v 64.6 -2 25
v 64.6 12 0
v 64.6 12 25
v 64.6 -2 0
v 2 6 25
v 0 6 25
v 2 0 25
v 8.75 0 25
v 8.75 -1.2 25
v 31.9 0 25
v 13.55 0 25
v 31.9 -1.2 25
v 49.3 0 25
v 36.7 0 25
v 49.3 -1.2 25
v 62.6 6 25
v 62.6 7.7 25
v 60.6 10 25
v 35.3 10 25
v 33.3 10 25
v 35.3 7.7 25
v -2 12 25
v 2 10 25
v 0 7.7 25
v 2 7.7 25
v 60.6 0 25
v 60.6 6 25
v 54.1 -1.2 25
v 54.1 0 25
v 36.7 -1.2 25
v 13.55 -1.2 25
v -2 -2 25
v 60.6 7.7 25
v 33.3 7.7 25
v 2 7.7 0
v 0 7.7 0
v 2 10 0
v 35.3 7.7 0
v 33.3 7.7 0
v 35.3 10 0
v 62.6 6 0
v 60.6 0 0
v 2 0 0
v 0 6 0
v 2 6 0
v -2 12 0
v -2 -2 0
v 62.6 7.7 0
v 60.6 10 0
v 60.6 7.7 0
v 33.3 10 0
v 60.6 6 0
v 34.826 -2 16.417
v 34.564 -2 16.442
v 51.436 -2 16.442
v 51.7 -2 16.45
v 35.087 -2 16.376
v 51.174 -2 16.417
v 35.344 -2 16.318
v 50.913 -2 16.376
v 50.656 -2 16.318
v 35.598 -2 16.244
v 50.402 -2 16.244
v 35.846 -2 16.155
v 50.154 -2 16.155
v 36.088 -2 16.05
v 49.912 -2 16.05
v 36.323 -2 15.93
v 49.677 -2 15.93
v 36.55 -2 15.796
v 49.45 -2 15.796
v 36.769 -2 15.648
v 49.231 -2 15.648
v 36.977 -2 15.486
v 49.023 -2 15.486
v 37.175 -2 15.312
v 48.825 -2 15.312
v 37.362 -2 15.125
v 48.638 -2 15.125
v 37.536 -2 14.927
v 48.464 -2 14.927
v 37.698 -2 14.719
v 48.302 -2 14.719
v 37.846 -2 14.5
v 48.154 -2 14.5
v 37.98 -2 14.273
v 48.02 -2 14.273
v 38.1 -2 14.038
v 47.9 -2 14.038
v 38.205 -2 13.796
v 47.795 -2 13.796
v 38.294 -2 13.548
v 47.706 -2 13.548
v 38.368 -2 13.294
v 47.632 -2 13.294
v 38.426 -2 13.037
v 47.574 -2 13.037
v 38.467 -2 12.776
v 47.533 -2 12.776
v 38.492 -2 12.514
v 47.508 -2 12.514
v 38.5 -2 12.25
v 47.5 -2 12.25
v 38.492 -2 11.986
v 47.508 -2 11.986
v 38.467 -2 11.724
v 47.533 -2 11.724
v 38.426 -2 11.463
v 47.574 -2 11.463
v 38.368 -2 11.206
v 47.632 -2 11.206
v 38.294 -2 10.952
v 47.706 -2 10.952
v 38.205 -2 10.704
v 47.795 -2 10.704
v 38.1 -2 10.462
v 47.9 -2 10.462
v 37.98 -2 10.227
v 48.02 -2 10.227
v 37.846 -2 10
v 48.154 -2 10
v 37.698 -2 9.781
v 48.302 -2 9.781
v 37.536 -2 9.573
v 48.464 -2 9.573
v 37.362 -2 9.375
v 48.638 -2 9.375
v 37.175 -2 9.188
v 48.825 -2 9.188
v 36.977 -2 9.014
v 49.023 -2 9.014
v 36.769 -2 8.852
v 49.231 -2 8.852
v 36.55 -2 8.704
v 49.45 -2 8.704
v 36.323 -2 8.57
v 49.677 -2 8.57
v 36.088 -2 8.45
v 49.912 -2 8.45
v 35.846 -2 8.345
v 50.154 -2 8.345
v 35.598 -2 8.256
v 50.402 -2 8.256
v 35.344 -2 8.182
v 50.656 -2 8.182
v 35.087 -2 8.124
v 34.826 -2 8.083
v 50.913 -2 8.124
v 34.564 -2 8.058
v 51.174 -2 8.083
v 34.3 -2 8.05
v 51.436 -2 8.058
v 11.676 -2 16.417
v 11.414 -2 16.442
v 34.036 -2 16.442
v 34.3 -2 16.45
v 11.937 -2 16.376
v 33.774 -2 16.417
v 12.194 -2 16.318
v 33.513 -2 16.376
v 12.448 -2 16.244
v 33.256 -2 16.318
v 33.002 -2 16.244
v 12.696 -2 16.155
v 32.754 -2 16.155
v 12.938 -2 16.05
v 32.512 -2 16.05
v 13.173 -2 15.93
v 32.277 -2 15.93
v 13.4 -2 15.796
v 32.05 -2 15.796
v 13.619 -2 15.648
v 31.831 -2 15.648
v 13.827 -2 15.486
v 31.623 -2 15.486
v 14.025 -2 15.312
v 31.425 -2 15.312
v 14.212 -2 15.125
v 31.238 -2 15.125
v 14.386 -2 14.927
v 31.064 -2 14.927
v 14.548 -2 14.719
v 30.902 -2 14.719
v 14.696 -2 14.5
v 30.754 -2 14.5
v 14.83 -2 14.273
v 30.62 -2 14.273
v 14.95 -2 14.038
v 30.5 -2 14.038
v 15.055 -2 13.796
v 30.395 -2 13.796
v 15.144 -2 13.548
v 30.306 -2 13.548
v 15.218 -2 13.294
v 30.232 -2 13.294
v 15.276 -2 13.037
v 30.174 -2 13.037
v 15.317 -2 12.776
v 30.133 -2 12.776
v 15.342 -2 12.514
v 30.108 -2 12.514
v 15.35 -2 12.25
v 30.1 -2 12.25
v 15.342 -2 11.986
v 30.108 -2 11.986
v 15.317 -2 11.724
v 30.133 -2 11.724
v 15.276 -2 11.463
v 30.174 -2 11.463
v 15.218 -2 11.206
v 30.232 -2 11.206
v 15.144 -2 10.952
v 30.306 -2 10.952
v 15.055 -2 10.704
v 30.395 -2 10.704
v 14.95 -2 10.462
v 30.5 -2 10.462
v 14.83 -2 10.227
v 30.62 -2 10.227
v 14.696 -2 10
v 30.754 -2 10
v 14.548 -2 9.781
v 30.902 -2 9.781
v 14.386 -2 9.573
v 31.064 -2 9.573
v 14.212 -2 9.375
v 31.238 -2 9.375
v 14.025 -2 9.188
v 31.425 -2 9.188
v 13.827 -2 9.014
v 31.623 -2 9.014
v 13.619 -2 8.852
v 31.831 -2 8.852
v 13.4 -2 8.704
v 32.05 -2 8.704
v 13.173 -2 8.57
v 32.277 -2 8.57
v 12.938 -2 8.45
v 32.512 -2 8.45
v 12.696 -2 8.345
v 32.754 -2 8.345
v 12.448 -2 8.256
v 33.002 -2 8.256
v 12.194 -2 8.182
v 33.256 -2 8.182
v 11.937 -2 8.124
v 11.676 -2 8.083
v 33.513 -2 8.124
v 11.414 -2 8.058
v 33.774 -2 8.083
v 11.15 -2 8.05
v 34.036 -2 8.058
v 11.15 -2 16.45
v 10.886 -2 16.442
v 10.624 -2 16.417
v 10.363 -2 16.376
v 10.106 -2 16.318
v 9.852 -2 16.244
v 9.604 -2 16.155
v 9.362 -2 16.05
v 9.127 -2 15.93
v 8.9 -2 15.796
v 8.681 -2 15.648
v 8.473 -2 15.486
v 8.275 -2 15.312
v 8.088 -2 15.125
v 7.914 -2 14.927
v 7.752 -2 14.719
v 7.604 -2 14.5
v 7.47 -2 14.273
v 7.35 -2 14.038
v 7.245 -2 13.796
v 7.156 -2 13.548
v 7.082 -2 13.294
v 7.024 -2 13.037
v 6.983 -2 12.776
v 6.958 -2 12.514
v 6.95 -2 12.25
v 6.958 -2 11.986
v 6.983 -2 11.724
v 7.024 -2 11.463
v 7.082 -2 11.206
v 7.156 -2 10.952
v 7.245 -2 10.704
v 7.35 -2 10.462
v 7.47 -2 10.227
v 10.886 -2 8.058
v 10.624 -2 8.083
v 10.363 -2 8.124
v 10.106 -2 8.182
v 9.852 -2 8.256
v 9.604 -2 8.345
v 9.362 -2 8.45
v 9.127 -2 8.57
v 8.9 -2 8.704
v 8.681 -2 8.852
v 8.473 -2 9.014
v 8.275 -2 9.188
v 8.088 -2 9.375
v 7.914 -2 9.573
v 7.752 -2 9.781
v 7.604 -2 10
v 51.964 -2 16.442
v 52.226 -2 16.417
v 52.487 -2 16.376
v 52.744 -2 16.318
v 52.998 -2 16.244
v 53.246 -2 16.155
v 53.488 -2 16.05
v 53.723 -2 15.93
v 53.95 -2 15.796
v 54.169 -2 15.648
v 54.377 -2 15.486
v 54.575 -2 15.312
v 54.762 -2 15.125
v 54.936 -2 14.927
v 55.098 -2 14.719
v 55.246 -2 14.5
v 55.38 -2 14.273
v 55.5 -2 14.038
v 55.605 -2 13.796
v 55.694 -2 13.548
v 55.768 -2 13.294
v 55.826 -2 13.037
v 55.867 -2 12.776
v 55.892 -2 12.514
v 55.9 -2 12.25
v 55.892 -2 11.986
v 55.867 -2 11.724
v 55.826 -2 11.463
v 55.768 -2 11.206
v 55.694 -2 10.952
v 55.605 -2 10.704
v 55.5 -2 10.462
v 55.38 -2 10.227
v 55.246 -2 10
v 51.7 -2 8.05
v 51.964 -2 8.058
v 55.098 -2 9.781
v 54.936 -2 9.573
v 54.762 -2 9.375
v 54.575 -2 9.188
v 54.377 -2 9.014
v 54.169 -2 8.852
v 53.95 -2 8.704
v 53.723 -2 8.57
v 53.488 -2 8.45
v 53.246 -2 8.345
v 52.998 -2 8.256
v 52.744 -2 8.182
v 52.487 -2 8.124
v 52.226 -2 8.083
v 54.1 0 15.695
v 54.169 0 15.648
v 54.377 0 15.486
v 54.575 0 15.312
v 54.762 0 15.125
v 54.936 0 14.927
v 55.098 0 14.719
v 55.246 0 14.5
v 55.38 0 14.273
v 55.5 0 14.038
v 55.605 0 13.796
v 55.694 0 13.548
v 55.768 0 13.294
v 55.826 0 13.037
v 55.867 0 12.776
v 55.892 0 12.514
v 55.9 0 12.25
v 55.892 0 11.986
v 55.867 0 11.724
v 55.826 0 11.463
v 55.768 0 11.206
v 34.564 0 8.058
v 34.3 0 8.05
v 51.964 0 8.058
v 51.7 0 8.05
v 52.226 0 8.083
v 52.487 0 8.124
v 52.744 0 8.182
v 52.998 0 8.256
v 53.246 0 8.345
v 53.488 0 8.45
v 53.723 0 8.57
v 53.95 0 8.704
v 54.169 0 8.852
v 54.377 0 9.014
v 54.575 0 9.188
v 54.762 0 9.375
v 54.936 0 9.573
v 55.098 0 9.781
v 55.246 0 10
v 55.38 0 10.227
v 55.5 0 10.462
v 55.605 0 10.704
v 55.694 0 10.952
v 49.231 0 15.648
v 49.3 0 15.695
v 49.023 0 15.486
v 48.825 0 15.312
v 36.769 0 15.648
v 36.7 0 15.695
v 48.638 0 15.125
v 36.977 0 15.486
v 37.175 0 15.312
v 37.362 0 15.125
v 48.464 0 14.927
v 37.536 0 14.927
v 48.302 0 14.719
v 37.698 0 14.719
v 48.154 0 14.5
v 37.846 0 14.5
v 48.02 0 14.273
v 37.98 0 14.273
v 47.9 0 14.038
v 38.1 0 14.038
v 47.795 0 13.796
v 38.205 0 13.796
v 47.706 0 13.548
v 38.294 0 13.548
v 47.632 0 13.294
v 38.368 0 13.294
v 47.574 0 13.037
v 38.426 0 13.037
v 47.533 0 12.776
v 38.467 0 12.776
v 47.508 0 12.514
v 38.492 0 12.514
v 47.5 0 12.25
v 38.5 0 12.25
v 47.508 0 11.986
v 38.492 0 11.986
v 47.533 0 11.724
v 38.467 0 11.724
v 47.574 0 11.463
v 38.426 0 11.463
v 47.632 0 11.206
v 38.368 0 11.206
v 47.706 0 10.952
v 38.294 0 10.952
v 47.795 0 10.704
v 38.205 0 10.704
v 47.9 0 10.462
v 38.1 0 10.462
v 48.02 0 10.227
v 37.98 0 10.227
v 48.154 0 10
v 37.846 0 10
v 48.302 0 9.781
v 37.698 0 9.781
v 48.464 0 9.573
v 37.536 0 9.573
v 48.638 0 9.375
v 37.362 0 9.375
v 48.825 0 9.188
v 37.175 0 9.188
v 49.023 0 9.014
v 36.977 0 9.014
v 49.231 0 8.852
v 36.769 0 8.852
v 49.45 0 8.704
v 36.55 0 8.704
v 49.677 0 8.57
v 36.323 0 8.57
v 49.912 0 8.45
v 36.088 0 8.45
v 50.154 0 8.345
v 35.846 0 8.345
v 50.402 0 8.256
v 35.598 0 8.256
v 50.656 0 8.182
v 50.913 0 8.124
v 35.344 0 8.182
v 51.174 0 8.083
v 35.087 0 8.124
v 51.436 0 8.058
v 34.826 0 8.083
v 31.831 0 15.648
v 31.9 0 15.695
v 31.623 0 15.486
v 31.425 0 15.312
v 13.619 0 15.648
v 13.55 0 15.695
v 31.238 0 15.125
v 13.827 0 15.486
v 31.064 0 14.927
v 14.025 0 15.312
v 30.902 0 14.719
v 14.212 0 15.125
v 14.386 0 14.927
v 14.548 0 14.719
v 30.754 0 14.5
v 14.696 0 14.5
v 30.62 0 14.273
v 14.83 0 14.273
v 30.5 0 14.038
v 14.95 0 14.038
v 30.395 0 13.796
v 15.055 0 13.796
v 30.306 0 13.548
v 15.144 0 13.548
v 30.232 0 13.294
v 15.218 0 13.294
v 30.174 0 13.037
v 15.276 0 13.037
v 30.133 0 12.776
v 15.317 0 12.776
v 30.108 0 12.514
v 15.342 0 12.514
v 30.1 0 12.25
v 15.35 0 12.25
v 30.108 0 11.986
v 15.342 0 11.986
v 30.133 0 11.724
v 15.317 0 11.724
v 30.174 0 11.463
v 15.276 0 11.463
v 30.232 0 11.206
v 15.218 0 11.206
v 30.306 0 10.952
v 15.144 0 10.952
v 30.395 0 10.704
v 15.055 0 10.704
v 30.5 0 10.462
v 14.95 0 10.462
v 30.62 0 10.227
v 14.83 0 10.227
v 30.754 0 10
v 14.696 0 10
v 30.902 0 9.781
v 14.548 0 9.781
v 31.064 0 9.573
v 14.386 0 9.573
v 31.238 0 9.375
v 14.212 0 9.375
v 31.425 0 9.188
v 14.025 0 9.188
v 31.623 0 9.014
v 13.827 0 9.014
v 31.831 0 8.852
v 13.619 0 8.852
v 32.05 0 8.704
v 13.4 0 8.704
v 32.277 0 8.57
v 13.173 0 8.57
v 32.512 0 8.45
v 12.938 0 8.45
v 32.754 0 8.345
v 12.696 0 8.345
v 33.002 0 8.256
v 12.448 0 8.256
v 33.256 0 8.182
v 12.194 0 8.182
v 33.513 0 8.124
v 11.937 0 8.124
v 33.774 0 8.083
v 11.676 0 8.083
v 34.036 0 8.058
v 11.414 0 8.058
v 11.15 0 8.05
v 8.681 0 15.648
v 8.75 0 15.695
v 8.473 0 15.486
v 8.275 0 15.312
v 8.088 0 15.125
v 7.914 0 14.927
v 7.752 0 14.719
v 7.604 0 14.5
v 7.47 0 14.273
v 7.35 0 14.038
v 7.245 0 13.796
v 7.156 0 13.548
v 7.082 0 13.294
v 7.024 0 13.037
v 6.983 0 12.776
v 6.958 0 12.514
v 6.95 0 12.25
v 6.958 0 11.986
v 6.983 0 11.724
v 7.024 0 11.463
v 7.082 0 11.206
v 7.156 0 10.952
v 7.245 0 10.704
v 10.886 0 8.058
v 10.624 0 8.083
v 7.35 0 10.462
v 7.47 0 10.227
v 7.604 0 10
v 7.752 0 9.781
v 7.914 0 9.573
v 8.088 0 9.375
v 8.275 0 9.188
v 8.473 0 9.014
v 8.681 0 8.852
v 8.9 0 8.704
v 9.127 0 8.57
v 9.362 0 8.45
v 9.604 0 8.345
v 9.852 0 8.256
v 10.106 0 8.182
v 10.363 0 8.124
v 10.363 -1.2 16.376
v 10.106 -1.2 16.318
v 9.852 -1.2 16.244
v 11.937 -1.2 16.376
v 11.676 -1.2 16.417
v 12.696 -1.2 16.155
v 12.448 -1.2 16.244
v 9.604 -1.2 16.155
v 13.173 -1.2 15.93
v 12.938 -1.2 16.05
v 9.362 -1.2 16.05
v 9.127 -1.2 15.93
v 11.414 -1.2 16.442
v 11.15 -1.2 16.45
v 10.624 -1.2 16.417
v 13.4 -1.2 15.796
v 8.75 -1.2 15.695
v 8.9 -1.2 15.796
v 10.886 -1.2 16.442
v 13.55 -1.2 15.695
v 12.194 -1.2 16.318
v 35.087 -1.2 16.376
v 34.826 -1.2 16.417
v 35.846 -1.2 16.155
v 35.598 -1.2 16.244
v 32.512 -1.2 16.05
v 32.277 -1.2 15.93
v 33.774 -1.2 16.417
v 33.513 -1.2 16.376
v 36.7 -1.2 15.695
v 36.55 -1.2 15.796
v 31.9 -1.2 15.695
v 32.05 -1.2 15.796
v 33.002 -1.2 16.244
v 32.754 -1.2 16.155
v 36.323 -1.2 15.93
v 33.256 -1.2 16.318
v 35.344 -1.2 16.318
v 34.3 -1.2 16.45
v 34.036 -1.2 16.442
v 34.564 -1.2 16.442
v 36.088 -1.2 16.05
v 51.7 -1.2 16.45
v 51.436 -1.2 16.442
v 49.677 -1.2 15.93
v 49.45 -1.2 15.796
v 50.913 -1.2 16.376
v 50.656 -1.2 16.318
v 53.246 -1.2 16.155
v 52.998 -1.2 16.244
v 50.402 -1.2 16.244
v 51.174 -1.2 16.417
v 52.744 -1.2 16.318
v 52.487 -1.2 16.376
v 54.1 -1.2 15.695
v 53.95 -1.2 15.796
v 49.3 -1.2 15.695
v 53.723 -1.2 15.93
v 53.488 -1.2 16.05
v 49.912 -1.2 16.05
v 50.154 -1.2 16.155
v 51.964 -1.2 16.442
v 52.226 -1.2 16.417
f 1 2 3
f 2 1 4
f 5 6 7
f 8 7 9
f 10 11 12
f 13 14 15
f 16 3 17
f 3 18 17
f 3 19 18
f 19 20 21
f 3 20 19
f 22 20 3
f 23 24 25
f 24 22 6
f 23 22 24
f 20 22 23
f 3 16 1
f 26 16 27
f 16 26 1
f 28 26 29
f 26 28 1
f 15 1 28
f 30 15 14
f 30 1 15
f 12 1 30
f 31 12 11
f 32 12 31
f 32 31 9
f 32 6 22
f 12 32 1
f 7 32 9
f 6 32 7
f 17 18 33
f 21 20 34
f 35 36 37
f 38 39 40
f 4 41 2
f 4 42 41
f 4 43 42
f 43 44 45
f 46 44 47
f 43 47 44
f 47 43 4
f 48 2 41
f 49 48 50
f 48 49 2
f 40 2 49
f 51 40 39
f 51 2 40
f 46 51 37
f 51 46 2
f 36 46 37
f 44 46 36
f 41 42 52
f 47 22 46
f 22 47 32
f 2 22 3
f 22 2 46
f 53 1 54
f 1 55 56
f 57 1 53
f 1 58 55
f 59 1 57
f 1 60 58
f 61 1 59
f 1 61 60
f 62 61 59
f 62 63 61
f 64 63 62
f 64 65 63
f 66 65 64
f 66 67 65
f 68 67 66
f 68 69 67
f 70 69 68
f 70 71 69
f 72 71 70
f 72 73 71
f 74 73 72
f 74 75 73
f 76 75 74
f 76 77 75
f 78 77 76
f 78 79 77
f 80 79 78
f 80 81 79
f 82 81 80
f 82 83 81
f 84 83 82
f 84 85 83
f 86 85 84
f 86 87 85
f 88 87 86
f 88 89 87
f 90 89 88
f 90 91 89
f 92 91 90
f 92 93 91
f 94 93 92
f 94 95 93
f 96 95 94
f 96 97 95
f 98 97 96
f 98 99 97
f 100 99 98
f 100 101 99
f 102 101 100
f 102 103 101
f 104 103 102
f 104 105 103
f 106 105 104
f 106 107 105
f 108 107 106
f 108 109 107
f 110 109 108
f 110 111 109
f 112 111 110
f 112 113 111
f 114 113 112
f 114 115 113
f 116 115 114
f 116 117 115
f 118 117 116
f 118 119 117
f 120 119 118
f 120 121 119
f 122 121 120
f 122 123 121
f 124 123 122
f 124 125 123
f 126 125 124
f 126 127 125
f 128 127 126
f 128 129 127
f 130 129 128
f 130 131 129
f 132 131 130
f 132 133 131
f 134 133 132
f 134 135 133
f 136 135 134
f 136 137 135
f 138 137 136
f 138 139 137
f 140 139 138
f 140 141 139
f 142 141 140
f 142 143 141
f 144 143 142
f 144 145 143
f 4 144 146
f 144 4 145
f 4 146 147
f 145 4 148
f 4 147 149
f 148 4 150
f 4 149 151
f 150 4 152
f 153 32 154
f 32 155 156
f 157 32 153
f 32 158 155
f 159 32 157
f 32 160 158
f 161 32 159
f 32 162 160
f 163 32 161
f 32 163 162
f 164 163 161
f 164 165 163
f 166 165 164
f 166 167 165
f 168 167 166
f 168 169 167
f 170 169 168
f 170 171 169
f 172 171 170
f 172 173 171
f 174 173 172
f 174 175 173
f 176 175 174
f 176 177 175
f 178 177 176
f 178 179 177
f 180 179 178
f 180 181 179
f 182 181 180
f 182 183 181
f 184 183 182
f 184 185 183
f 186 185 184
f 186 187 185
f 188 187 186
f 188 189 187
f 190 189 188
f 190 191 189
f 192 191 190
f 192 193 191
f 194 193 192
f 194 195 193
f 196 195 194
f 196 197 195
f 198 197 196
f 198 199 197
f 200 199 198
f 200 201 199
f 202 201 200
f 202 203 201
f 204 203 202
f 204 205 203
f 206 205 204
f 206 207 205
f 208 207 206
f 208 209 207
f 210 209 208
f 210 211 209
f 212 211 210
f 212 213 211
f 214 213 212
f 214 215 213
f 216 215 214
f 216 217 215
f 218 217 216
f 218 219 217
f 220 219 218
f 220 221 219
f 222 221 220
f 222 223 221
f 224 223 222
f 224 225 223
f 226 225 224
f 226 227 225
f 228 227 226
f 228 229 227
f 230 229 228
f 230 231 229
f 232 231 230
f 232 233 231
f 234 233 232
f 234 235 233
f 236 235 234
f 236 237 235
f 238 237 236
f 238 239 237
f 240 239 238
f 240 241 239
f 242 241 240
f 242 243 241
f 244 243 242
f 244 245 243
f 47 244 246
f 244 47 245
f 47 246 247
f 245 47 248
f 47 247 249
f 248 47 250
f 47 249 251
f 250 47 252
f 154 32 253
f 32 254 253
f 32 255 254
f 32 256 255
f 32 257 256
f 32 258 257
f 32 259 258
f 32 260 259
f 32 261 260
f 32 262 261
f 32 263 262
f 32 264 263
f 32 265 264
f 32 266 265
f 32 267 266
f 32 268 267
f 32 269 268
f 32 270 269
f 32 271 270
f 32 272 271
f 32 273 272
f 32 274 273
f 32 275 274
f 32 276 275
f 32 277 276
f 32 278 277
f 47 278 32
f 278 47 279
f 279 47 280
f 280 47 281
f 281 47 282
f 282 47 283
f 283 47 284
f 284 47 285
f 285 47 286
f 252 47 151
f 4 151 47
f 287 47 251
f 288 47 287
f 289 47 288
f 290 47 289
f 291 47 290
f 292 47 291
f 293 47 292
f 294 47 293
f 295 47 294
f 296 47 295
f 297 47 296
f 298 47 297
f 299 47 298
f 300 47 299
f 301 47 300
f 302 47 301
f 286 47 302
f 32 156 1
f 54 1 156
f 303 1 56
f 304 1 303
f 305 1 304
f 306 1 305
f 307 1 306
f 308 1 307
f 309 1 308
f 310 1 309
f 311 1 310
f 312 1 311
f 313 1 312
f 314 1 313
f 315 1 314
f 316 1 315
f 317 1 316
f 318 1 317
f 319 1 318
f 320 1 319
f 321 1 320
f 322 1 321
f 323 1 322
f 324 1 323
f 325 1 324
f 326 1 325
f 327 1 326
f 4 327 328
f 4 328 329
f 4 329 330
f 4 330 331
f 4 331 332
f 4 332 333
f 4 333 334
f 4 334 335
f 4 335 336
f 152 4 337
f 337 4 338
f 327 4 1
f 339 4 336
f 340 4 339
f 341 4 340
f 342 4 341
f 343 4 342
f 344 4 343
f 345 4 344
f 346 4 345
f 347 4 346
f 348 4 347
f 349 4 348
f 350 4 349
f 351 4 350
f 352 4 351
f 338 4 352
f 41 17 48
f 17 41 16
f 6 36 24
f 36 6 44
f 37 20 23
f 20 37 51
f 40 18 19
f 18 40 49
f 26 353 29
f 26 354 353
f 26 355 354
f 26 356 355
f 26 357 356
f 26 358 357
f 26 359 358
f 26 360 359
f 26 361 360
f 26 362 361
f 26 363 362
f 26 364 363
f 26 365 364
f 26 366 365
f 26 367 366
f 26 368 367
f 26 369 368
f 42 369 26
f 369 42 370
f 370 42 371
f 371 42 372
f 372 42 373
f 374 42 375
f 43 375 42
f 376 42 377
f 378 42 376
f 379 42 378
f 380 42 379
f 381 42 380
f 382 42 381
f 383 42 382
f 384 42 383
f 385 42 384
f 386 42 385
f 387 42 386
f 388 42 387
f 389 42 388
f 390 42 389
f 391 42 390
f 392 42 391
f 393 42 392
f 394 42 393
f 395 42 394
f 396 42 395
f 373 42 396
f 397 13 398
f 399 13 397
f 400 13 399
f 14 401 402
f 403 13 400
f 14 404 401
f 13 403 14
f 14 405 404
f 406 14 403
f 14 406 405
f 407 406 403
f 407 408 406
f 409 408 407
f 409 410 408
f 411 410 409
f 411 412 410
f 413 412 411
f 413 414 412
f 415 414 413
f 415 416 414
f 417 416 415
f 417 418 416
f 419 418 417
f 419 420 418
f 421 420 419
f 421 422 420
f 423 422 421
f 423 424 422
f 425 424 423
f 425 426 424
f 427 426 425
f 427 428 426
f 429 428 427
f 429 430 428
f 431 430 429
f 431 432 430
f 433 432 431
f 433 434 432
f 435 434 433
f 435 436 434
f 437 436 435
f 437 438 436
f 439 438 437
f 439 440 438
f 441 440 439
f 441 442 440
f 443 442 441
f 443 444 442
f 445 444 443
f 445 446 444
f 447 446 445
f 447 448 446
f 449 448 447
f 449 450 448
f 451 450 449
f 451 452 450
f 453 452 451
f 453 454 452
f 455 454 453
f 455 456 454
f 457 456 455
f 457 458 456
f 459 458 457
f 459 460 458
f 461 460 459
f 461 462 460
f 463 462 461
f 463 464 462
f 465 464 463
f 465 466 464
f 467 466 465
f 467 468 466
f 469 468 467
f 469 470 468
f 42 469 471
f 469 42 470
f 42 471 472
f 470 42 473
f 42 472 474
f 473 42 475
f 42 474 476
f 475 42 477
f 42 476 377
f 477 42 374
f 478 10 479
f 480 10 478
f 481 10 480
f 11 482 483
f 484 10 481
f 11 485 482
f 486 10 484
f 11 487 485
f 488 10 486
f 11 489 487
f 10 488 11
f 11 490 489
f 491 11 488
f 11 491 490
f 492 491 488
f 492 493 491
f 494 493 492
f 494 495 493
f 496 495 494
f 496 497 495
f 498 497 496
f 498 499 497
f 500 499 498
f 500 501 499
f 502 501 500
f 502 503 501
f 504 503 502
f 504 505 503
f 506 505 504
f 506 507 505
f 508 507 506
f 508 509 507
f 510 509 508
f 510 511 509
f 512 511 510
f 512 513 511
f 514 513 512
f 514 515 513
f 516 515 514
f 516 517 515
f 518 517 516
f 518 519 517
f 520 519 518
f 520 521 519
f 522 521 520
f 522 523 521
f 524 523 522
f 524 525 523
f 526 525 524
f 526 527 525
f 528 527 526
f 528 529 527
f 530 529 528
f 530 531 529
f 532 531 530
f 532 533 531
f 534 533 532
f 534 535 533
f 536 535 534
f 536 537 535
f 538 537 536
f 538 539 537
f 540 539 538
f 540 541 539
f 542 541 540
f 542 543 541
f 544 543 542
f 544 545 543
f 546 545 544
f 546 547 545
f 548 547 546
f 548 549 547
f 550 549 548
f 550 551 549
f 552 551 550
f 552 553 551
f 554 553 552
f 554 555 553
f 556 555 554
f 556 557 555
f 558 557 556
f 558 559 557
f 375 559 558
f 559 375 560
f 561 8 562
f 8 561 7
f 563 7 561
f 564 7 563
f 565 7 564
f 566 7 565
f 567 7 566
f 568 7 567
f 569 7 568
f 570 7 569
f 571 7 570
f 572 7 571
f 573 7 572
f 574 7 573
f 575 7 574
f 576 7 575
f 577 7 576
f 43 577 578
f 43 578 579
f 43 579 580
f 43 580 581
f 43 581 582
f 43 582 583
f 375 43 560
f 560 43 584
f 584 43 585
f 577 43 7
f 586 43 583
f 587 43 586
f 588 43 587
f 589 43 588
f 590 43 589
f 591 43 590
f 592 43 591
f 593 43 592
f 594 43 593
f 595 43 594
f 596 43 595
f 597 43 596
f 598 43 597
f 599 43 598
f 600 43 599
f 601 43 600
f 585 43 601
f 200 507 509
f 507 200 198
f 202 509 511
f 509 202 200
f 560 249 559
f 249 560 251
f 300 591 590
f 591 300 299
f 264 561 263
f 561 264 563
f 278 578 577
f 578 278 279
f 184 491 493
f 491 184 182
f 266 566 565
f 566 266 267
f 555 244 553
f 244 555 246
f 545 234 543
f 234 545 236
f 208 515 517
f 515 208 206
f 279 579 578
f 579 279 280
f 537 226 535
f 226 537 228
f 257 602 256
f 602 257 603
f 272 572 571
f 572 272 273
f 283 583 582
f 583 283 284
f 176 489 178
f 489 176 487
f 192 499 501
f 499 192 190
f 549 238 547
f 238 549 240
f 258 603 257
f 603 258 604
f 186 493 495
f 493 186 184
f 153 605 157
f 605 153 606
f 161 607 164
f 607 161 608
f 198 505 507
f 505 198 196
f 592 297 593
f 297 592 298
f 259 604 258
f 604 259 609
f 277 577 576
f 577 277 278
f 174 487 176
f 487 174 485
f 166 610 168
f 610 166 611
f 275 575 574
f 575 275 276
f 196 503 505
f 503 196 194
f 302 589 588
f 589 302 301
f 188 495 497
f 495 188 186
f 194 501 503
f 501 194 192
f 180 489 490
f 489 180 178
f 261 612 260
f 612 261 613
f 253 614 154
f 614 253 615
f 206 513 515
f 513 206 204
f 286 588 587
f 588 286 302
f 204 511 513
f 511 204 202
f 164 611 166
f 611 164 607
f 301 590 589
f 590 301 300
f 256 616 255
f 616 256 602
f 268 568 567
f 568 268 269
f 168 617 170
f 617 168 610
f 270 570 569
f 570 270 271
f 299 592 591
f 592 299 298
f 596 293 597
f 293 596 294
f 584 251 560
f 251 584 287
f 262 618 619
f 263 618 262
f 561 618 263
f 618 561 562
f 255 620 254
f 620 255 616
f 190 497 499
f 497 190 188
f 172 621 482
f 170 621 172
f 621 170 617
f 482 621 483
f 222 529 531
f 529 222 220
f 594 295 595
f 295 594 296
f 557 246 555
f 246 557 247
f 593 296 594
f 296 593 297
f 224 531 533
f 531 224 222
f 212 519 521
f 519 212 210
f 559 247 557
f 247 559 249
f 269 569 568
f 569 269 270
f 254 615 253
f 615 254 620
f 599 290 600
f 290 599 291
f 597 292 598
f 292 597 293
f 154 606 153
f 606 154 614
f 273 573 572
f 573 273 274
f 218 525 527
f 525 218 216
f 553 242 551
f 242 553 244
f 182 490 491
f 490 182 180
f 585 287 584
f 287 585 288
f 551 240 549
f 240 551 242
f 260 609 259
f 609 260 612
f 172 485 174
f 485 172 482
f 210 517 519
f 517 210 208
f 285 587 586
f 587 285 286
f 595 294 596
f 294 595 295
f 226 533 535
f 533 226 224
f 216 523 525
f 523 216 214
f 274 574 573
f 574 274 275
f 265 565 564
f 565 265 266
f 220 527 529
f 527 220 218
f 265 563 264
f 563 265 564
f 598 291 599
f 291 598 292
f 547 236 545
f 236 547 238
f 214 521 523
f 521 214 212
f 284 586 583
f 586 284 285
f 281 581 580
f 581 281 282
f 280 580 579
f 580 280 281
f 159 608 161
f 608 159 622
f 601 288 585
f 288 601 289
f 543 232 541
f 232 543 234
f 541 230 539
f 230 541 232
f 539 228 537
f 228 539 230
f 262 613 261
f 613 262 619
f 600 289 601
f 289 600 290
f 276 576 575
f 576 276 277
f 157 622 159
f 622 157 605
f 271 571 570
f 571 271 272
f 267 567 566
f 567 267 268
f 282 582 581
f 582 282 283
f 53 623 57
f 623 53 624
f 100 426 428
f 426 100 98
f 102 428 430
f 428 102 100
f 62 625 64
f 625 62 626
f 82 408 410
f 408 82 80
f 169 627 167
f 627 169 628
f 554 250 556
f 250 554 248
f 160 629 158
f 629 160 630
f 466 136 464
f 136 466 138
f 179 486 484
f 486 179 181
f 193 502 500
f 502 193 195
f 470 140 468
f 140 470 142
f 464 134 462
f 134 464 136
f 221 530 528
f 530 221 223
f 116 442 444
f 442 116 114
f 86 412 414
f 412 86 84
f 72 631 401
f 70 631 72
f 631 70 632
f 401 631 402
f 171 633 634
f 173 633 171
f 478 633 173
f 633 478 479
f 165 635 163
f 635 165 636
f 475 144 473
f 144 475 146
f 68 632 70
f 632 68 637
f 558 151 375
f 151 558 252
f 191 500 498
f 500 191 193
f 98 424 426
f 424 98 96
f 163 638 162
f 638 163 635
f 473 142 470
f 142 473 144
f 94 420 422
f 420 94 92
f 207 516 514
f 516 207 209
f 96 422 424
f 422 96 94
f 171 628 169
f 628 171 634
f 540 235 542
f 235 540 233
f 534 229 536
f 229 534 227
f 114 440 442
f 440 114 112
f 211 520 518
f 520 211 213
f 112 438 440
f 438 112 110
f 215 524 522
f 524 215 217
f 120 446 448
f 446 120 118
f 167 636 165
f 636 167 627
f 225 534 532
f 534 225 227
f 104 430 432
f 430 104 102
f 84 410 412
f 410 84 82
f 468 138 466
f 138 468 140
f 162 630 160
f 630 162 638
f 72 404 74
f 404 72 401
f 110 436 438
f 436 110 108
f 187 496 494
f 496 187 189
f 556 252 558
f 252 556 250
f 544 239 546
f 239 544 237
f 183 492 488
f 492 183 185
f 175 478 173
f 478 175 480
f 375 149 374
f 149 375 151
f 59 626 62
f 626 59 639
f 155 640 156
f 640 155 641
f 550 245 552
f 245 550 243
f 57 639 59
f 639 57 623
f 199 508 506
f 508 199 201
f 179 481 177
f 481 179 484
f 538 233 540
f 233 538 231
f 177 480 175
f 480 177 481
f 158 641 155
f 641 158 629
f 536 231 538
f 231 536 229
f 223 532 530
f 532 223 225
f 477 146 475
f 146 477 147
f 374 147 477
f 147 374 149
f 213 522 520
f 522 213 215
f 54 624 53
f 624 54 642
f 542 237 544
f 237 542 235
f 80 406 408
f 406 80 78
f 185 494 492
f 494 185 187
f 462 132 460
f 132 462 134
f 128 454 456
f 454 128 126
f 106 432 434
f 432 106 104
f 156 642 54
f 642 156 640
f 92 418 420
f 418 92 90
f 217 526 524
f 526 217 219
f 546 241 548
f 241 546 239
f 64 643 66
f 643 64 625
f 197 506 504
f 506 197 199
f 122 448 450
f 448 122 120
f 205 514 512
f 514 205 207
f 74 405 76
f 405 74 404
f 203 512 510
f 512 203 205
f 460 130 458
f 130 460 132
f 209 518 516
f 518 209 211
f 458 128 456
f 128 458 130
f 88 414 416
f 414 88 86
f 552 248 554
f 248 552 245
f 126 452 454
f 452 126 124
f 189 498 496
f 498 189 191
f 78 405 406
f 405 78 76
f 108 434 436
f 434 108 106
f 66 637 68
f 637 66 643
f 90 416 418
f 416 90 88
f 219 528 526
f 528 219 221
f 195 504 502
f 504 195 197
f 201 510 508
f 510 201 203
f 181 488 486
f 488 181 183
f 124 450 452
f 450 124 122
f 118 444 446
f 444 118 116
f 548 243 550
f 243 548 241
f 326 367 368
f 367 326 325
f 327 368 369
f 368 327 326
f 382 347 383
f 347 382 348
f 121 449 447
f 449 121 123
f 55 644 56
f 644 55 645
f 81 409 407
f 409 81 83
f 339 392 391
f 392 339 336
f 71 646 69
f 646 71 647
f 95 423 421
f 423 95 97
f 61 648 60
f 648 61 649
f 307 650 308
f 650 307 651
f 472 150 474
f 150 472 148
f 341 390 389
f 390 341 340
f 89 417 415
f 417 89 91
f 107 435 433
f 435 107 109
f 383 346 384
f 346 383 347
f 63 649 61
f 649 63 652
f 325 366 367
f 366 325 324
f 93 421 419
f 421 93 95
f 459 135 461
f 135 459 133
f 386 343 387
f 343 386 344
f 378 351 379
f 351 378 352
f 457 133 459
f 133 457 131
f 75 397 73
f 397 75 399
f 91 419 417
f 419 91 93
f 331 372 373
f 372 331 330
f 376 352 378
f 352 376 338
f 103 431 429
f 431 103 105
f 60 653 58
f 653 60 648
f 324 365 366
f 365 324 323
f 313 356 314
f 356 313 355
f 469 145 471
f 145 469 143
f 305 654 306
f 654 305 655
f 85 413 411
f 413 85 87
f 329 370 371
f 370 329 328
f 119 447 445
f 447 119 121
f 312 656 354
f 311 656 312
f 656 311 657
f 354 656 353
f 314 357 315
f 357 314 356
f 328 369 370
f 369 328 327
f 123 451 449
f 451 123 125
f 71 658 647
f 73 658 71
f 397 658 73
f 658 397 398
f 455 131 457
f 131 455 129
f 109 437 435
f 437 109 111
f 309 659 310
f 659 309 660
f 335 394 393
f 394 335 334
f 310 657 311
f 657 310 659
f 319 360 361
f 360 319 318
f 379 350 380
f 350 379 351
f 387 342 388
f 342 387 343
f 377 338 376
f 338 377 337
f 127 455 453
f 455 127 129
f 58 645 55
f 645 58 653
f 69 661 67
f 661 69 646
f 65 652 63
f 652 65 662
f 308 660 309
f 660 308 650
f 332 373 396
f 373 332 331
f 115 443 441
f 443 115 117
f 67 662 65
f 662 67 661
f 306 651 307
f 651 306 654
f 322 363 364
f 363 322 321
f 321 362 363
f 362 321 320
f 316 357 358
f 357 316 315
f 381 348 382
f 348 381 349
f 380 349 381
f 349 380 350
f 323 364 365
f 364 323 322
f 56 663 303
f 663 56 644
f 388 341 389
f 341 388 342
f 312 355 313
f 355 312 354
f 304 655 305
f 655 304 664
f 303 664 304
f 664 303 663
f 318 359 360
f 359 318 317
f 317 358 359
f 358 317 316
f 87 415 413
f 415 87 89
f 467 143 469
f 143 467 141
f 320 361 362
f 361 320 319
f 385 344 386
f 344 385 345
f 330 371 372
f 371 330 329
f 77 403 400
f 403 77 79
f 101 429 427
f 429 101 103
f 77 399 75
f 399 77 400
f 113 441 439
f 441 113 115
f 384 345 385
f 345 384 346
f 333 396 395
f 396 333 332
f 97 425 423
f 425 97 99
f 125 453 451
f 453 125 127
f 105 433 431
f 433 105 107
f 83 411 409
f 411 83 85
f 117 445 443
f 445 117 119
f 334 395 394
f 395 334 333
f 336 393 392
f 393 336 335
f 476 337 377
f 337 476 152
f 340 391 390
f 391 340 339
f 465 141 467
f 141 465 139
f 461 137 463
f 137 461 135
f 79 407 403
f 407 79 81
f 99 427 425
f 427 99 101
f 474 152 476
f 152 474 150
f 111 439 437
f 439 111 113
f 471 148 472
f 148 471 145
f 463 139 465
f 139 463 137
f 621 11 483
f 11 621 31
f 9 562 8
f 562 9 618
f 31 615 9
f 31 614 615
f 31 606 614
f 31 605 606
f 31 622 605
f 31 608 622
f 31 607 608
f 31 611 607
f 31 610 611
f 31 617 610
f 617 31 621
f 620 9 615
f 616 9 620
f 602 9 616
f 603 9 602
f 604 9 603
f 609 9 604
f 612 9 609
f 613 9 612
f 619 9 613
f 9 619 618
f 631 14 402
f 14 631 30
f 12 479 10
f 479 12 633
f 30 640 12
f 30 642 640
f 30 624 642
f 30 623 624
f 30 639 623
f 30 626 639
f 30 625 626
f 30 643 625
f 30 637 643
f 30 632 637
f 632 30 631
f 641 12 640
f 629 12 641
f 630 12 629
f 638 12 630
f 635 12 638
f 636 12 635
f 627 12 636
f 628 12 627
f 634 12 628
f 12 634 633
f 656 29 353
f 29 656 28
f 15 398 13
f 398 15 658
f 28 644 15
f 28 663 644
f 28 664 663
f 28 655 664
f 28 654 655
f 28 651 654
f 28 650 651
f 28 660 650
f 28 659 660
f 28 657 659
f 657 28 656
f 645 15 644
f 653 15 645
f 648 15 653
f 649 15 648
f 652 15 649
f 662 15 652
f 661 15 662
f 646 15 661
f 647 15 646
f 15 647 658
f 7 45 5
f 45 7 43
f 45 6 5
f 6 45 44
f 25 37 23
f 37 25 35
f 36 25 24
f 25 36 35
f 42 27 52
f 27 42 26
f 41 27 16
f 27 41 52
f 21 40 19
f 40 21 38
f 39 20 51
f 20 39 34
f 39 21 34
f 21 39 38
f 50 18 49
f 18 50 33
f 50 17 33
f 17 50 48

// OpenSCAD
/* service buttons panel replicator FK-266
vim: ai ts=2
*/

$fn = 100;

difference(){
	translate([-2,-2,  0]) cube([ 66.60, 14.00, 25.00]);
	translate([ 0, 0, -1]) cube([ 62.60, 10.00, 27.00]);
	translate([ 11.15, 1,  12.25]) rotate([ 90,  0,  0]) cylinder(r=4.2, h=4);
	translate([ 34.30, 1,  12.25]) rotate([ 90,  0,  0]) cylinder(r=4.2, h=4);
	translate([ 51.70, 1,  12.25]) rotate([ 90,  0,  0]) cylinder(r=4.2, h=4);
	translate([  8.75, -1.20,  12.90]) cube([ 4.80, 2.00, 12.25]);
	translate([ 31.90, -1.20,  12.90]) cube([ 4.80, 2.00, 12.25]);
	translate([ 49.30, -1.20,  12.90]) cube([ 4.80, 2.00, 12.25]);
}

	translate([   0,    0,     0]) cube([  2.00, 6.00, 25.00]);
	translate([   0,    7.70,  0]) cube([  2.00, 3.00, 25.00]);
	translate([  60.60, 0,     0]) cube([  2.00, 6.00, 25.00]);
	translate([  33.30, 7.70,  0]) cube([  2.00, 3.00, 25.00]);
	translate([  60.60, 7.70,  0]) cube([  2.00, 3.00, 25.00]);
